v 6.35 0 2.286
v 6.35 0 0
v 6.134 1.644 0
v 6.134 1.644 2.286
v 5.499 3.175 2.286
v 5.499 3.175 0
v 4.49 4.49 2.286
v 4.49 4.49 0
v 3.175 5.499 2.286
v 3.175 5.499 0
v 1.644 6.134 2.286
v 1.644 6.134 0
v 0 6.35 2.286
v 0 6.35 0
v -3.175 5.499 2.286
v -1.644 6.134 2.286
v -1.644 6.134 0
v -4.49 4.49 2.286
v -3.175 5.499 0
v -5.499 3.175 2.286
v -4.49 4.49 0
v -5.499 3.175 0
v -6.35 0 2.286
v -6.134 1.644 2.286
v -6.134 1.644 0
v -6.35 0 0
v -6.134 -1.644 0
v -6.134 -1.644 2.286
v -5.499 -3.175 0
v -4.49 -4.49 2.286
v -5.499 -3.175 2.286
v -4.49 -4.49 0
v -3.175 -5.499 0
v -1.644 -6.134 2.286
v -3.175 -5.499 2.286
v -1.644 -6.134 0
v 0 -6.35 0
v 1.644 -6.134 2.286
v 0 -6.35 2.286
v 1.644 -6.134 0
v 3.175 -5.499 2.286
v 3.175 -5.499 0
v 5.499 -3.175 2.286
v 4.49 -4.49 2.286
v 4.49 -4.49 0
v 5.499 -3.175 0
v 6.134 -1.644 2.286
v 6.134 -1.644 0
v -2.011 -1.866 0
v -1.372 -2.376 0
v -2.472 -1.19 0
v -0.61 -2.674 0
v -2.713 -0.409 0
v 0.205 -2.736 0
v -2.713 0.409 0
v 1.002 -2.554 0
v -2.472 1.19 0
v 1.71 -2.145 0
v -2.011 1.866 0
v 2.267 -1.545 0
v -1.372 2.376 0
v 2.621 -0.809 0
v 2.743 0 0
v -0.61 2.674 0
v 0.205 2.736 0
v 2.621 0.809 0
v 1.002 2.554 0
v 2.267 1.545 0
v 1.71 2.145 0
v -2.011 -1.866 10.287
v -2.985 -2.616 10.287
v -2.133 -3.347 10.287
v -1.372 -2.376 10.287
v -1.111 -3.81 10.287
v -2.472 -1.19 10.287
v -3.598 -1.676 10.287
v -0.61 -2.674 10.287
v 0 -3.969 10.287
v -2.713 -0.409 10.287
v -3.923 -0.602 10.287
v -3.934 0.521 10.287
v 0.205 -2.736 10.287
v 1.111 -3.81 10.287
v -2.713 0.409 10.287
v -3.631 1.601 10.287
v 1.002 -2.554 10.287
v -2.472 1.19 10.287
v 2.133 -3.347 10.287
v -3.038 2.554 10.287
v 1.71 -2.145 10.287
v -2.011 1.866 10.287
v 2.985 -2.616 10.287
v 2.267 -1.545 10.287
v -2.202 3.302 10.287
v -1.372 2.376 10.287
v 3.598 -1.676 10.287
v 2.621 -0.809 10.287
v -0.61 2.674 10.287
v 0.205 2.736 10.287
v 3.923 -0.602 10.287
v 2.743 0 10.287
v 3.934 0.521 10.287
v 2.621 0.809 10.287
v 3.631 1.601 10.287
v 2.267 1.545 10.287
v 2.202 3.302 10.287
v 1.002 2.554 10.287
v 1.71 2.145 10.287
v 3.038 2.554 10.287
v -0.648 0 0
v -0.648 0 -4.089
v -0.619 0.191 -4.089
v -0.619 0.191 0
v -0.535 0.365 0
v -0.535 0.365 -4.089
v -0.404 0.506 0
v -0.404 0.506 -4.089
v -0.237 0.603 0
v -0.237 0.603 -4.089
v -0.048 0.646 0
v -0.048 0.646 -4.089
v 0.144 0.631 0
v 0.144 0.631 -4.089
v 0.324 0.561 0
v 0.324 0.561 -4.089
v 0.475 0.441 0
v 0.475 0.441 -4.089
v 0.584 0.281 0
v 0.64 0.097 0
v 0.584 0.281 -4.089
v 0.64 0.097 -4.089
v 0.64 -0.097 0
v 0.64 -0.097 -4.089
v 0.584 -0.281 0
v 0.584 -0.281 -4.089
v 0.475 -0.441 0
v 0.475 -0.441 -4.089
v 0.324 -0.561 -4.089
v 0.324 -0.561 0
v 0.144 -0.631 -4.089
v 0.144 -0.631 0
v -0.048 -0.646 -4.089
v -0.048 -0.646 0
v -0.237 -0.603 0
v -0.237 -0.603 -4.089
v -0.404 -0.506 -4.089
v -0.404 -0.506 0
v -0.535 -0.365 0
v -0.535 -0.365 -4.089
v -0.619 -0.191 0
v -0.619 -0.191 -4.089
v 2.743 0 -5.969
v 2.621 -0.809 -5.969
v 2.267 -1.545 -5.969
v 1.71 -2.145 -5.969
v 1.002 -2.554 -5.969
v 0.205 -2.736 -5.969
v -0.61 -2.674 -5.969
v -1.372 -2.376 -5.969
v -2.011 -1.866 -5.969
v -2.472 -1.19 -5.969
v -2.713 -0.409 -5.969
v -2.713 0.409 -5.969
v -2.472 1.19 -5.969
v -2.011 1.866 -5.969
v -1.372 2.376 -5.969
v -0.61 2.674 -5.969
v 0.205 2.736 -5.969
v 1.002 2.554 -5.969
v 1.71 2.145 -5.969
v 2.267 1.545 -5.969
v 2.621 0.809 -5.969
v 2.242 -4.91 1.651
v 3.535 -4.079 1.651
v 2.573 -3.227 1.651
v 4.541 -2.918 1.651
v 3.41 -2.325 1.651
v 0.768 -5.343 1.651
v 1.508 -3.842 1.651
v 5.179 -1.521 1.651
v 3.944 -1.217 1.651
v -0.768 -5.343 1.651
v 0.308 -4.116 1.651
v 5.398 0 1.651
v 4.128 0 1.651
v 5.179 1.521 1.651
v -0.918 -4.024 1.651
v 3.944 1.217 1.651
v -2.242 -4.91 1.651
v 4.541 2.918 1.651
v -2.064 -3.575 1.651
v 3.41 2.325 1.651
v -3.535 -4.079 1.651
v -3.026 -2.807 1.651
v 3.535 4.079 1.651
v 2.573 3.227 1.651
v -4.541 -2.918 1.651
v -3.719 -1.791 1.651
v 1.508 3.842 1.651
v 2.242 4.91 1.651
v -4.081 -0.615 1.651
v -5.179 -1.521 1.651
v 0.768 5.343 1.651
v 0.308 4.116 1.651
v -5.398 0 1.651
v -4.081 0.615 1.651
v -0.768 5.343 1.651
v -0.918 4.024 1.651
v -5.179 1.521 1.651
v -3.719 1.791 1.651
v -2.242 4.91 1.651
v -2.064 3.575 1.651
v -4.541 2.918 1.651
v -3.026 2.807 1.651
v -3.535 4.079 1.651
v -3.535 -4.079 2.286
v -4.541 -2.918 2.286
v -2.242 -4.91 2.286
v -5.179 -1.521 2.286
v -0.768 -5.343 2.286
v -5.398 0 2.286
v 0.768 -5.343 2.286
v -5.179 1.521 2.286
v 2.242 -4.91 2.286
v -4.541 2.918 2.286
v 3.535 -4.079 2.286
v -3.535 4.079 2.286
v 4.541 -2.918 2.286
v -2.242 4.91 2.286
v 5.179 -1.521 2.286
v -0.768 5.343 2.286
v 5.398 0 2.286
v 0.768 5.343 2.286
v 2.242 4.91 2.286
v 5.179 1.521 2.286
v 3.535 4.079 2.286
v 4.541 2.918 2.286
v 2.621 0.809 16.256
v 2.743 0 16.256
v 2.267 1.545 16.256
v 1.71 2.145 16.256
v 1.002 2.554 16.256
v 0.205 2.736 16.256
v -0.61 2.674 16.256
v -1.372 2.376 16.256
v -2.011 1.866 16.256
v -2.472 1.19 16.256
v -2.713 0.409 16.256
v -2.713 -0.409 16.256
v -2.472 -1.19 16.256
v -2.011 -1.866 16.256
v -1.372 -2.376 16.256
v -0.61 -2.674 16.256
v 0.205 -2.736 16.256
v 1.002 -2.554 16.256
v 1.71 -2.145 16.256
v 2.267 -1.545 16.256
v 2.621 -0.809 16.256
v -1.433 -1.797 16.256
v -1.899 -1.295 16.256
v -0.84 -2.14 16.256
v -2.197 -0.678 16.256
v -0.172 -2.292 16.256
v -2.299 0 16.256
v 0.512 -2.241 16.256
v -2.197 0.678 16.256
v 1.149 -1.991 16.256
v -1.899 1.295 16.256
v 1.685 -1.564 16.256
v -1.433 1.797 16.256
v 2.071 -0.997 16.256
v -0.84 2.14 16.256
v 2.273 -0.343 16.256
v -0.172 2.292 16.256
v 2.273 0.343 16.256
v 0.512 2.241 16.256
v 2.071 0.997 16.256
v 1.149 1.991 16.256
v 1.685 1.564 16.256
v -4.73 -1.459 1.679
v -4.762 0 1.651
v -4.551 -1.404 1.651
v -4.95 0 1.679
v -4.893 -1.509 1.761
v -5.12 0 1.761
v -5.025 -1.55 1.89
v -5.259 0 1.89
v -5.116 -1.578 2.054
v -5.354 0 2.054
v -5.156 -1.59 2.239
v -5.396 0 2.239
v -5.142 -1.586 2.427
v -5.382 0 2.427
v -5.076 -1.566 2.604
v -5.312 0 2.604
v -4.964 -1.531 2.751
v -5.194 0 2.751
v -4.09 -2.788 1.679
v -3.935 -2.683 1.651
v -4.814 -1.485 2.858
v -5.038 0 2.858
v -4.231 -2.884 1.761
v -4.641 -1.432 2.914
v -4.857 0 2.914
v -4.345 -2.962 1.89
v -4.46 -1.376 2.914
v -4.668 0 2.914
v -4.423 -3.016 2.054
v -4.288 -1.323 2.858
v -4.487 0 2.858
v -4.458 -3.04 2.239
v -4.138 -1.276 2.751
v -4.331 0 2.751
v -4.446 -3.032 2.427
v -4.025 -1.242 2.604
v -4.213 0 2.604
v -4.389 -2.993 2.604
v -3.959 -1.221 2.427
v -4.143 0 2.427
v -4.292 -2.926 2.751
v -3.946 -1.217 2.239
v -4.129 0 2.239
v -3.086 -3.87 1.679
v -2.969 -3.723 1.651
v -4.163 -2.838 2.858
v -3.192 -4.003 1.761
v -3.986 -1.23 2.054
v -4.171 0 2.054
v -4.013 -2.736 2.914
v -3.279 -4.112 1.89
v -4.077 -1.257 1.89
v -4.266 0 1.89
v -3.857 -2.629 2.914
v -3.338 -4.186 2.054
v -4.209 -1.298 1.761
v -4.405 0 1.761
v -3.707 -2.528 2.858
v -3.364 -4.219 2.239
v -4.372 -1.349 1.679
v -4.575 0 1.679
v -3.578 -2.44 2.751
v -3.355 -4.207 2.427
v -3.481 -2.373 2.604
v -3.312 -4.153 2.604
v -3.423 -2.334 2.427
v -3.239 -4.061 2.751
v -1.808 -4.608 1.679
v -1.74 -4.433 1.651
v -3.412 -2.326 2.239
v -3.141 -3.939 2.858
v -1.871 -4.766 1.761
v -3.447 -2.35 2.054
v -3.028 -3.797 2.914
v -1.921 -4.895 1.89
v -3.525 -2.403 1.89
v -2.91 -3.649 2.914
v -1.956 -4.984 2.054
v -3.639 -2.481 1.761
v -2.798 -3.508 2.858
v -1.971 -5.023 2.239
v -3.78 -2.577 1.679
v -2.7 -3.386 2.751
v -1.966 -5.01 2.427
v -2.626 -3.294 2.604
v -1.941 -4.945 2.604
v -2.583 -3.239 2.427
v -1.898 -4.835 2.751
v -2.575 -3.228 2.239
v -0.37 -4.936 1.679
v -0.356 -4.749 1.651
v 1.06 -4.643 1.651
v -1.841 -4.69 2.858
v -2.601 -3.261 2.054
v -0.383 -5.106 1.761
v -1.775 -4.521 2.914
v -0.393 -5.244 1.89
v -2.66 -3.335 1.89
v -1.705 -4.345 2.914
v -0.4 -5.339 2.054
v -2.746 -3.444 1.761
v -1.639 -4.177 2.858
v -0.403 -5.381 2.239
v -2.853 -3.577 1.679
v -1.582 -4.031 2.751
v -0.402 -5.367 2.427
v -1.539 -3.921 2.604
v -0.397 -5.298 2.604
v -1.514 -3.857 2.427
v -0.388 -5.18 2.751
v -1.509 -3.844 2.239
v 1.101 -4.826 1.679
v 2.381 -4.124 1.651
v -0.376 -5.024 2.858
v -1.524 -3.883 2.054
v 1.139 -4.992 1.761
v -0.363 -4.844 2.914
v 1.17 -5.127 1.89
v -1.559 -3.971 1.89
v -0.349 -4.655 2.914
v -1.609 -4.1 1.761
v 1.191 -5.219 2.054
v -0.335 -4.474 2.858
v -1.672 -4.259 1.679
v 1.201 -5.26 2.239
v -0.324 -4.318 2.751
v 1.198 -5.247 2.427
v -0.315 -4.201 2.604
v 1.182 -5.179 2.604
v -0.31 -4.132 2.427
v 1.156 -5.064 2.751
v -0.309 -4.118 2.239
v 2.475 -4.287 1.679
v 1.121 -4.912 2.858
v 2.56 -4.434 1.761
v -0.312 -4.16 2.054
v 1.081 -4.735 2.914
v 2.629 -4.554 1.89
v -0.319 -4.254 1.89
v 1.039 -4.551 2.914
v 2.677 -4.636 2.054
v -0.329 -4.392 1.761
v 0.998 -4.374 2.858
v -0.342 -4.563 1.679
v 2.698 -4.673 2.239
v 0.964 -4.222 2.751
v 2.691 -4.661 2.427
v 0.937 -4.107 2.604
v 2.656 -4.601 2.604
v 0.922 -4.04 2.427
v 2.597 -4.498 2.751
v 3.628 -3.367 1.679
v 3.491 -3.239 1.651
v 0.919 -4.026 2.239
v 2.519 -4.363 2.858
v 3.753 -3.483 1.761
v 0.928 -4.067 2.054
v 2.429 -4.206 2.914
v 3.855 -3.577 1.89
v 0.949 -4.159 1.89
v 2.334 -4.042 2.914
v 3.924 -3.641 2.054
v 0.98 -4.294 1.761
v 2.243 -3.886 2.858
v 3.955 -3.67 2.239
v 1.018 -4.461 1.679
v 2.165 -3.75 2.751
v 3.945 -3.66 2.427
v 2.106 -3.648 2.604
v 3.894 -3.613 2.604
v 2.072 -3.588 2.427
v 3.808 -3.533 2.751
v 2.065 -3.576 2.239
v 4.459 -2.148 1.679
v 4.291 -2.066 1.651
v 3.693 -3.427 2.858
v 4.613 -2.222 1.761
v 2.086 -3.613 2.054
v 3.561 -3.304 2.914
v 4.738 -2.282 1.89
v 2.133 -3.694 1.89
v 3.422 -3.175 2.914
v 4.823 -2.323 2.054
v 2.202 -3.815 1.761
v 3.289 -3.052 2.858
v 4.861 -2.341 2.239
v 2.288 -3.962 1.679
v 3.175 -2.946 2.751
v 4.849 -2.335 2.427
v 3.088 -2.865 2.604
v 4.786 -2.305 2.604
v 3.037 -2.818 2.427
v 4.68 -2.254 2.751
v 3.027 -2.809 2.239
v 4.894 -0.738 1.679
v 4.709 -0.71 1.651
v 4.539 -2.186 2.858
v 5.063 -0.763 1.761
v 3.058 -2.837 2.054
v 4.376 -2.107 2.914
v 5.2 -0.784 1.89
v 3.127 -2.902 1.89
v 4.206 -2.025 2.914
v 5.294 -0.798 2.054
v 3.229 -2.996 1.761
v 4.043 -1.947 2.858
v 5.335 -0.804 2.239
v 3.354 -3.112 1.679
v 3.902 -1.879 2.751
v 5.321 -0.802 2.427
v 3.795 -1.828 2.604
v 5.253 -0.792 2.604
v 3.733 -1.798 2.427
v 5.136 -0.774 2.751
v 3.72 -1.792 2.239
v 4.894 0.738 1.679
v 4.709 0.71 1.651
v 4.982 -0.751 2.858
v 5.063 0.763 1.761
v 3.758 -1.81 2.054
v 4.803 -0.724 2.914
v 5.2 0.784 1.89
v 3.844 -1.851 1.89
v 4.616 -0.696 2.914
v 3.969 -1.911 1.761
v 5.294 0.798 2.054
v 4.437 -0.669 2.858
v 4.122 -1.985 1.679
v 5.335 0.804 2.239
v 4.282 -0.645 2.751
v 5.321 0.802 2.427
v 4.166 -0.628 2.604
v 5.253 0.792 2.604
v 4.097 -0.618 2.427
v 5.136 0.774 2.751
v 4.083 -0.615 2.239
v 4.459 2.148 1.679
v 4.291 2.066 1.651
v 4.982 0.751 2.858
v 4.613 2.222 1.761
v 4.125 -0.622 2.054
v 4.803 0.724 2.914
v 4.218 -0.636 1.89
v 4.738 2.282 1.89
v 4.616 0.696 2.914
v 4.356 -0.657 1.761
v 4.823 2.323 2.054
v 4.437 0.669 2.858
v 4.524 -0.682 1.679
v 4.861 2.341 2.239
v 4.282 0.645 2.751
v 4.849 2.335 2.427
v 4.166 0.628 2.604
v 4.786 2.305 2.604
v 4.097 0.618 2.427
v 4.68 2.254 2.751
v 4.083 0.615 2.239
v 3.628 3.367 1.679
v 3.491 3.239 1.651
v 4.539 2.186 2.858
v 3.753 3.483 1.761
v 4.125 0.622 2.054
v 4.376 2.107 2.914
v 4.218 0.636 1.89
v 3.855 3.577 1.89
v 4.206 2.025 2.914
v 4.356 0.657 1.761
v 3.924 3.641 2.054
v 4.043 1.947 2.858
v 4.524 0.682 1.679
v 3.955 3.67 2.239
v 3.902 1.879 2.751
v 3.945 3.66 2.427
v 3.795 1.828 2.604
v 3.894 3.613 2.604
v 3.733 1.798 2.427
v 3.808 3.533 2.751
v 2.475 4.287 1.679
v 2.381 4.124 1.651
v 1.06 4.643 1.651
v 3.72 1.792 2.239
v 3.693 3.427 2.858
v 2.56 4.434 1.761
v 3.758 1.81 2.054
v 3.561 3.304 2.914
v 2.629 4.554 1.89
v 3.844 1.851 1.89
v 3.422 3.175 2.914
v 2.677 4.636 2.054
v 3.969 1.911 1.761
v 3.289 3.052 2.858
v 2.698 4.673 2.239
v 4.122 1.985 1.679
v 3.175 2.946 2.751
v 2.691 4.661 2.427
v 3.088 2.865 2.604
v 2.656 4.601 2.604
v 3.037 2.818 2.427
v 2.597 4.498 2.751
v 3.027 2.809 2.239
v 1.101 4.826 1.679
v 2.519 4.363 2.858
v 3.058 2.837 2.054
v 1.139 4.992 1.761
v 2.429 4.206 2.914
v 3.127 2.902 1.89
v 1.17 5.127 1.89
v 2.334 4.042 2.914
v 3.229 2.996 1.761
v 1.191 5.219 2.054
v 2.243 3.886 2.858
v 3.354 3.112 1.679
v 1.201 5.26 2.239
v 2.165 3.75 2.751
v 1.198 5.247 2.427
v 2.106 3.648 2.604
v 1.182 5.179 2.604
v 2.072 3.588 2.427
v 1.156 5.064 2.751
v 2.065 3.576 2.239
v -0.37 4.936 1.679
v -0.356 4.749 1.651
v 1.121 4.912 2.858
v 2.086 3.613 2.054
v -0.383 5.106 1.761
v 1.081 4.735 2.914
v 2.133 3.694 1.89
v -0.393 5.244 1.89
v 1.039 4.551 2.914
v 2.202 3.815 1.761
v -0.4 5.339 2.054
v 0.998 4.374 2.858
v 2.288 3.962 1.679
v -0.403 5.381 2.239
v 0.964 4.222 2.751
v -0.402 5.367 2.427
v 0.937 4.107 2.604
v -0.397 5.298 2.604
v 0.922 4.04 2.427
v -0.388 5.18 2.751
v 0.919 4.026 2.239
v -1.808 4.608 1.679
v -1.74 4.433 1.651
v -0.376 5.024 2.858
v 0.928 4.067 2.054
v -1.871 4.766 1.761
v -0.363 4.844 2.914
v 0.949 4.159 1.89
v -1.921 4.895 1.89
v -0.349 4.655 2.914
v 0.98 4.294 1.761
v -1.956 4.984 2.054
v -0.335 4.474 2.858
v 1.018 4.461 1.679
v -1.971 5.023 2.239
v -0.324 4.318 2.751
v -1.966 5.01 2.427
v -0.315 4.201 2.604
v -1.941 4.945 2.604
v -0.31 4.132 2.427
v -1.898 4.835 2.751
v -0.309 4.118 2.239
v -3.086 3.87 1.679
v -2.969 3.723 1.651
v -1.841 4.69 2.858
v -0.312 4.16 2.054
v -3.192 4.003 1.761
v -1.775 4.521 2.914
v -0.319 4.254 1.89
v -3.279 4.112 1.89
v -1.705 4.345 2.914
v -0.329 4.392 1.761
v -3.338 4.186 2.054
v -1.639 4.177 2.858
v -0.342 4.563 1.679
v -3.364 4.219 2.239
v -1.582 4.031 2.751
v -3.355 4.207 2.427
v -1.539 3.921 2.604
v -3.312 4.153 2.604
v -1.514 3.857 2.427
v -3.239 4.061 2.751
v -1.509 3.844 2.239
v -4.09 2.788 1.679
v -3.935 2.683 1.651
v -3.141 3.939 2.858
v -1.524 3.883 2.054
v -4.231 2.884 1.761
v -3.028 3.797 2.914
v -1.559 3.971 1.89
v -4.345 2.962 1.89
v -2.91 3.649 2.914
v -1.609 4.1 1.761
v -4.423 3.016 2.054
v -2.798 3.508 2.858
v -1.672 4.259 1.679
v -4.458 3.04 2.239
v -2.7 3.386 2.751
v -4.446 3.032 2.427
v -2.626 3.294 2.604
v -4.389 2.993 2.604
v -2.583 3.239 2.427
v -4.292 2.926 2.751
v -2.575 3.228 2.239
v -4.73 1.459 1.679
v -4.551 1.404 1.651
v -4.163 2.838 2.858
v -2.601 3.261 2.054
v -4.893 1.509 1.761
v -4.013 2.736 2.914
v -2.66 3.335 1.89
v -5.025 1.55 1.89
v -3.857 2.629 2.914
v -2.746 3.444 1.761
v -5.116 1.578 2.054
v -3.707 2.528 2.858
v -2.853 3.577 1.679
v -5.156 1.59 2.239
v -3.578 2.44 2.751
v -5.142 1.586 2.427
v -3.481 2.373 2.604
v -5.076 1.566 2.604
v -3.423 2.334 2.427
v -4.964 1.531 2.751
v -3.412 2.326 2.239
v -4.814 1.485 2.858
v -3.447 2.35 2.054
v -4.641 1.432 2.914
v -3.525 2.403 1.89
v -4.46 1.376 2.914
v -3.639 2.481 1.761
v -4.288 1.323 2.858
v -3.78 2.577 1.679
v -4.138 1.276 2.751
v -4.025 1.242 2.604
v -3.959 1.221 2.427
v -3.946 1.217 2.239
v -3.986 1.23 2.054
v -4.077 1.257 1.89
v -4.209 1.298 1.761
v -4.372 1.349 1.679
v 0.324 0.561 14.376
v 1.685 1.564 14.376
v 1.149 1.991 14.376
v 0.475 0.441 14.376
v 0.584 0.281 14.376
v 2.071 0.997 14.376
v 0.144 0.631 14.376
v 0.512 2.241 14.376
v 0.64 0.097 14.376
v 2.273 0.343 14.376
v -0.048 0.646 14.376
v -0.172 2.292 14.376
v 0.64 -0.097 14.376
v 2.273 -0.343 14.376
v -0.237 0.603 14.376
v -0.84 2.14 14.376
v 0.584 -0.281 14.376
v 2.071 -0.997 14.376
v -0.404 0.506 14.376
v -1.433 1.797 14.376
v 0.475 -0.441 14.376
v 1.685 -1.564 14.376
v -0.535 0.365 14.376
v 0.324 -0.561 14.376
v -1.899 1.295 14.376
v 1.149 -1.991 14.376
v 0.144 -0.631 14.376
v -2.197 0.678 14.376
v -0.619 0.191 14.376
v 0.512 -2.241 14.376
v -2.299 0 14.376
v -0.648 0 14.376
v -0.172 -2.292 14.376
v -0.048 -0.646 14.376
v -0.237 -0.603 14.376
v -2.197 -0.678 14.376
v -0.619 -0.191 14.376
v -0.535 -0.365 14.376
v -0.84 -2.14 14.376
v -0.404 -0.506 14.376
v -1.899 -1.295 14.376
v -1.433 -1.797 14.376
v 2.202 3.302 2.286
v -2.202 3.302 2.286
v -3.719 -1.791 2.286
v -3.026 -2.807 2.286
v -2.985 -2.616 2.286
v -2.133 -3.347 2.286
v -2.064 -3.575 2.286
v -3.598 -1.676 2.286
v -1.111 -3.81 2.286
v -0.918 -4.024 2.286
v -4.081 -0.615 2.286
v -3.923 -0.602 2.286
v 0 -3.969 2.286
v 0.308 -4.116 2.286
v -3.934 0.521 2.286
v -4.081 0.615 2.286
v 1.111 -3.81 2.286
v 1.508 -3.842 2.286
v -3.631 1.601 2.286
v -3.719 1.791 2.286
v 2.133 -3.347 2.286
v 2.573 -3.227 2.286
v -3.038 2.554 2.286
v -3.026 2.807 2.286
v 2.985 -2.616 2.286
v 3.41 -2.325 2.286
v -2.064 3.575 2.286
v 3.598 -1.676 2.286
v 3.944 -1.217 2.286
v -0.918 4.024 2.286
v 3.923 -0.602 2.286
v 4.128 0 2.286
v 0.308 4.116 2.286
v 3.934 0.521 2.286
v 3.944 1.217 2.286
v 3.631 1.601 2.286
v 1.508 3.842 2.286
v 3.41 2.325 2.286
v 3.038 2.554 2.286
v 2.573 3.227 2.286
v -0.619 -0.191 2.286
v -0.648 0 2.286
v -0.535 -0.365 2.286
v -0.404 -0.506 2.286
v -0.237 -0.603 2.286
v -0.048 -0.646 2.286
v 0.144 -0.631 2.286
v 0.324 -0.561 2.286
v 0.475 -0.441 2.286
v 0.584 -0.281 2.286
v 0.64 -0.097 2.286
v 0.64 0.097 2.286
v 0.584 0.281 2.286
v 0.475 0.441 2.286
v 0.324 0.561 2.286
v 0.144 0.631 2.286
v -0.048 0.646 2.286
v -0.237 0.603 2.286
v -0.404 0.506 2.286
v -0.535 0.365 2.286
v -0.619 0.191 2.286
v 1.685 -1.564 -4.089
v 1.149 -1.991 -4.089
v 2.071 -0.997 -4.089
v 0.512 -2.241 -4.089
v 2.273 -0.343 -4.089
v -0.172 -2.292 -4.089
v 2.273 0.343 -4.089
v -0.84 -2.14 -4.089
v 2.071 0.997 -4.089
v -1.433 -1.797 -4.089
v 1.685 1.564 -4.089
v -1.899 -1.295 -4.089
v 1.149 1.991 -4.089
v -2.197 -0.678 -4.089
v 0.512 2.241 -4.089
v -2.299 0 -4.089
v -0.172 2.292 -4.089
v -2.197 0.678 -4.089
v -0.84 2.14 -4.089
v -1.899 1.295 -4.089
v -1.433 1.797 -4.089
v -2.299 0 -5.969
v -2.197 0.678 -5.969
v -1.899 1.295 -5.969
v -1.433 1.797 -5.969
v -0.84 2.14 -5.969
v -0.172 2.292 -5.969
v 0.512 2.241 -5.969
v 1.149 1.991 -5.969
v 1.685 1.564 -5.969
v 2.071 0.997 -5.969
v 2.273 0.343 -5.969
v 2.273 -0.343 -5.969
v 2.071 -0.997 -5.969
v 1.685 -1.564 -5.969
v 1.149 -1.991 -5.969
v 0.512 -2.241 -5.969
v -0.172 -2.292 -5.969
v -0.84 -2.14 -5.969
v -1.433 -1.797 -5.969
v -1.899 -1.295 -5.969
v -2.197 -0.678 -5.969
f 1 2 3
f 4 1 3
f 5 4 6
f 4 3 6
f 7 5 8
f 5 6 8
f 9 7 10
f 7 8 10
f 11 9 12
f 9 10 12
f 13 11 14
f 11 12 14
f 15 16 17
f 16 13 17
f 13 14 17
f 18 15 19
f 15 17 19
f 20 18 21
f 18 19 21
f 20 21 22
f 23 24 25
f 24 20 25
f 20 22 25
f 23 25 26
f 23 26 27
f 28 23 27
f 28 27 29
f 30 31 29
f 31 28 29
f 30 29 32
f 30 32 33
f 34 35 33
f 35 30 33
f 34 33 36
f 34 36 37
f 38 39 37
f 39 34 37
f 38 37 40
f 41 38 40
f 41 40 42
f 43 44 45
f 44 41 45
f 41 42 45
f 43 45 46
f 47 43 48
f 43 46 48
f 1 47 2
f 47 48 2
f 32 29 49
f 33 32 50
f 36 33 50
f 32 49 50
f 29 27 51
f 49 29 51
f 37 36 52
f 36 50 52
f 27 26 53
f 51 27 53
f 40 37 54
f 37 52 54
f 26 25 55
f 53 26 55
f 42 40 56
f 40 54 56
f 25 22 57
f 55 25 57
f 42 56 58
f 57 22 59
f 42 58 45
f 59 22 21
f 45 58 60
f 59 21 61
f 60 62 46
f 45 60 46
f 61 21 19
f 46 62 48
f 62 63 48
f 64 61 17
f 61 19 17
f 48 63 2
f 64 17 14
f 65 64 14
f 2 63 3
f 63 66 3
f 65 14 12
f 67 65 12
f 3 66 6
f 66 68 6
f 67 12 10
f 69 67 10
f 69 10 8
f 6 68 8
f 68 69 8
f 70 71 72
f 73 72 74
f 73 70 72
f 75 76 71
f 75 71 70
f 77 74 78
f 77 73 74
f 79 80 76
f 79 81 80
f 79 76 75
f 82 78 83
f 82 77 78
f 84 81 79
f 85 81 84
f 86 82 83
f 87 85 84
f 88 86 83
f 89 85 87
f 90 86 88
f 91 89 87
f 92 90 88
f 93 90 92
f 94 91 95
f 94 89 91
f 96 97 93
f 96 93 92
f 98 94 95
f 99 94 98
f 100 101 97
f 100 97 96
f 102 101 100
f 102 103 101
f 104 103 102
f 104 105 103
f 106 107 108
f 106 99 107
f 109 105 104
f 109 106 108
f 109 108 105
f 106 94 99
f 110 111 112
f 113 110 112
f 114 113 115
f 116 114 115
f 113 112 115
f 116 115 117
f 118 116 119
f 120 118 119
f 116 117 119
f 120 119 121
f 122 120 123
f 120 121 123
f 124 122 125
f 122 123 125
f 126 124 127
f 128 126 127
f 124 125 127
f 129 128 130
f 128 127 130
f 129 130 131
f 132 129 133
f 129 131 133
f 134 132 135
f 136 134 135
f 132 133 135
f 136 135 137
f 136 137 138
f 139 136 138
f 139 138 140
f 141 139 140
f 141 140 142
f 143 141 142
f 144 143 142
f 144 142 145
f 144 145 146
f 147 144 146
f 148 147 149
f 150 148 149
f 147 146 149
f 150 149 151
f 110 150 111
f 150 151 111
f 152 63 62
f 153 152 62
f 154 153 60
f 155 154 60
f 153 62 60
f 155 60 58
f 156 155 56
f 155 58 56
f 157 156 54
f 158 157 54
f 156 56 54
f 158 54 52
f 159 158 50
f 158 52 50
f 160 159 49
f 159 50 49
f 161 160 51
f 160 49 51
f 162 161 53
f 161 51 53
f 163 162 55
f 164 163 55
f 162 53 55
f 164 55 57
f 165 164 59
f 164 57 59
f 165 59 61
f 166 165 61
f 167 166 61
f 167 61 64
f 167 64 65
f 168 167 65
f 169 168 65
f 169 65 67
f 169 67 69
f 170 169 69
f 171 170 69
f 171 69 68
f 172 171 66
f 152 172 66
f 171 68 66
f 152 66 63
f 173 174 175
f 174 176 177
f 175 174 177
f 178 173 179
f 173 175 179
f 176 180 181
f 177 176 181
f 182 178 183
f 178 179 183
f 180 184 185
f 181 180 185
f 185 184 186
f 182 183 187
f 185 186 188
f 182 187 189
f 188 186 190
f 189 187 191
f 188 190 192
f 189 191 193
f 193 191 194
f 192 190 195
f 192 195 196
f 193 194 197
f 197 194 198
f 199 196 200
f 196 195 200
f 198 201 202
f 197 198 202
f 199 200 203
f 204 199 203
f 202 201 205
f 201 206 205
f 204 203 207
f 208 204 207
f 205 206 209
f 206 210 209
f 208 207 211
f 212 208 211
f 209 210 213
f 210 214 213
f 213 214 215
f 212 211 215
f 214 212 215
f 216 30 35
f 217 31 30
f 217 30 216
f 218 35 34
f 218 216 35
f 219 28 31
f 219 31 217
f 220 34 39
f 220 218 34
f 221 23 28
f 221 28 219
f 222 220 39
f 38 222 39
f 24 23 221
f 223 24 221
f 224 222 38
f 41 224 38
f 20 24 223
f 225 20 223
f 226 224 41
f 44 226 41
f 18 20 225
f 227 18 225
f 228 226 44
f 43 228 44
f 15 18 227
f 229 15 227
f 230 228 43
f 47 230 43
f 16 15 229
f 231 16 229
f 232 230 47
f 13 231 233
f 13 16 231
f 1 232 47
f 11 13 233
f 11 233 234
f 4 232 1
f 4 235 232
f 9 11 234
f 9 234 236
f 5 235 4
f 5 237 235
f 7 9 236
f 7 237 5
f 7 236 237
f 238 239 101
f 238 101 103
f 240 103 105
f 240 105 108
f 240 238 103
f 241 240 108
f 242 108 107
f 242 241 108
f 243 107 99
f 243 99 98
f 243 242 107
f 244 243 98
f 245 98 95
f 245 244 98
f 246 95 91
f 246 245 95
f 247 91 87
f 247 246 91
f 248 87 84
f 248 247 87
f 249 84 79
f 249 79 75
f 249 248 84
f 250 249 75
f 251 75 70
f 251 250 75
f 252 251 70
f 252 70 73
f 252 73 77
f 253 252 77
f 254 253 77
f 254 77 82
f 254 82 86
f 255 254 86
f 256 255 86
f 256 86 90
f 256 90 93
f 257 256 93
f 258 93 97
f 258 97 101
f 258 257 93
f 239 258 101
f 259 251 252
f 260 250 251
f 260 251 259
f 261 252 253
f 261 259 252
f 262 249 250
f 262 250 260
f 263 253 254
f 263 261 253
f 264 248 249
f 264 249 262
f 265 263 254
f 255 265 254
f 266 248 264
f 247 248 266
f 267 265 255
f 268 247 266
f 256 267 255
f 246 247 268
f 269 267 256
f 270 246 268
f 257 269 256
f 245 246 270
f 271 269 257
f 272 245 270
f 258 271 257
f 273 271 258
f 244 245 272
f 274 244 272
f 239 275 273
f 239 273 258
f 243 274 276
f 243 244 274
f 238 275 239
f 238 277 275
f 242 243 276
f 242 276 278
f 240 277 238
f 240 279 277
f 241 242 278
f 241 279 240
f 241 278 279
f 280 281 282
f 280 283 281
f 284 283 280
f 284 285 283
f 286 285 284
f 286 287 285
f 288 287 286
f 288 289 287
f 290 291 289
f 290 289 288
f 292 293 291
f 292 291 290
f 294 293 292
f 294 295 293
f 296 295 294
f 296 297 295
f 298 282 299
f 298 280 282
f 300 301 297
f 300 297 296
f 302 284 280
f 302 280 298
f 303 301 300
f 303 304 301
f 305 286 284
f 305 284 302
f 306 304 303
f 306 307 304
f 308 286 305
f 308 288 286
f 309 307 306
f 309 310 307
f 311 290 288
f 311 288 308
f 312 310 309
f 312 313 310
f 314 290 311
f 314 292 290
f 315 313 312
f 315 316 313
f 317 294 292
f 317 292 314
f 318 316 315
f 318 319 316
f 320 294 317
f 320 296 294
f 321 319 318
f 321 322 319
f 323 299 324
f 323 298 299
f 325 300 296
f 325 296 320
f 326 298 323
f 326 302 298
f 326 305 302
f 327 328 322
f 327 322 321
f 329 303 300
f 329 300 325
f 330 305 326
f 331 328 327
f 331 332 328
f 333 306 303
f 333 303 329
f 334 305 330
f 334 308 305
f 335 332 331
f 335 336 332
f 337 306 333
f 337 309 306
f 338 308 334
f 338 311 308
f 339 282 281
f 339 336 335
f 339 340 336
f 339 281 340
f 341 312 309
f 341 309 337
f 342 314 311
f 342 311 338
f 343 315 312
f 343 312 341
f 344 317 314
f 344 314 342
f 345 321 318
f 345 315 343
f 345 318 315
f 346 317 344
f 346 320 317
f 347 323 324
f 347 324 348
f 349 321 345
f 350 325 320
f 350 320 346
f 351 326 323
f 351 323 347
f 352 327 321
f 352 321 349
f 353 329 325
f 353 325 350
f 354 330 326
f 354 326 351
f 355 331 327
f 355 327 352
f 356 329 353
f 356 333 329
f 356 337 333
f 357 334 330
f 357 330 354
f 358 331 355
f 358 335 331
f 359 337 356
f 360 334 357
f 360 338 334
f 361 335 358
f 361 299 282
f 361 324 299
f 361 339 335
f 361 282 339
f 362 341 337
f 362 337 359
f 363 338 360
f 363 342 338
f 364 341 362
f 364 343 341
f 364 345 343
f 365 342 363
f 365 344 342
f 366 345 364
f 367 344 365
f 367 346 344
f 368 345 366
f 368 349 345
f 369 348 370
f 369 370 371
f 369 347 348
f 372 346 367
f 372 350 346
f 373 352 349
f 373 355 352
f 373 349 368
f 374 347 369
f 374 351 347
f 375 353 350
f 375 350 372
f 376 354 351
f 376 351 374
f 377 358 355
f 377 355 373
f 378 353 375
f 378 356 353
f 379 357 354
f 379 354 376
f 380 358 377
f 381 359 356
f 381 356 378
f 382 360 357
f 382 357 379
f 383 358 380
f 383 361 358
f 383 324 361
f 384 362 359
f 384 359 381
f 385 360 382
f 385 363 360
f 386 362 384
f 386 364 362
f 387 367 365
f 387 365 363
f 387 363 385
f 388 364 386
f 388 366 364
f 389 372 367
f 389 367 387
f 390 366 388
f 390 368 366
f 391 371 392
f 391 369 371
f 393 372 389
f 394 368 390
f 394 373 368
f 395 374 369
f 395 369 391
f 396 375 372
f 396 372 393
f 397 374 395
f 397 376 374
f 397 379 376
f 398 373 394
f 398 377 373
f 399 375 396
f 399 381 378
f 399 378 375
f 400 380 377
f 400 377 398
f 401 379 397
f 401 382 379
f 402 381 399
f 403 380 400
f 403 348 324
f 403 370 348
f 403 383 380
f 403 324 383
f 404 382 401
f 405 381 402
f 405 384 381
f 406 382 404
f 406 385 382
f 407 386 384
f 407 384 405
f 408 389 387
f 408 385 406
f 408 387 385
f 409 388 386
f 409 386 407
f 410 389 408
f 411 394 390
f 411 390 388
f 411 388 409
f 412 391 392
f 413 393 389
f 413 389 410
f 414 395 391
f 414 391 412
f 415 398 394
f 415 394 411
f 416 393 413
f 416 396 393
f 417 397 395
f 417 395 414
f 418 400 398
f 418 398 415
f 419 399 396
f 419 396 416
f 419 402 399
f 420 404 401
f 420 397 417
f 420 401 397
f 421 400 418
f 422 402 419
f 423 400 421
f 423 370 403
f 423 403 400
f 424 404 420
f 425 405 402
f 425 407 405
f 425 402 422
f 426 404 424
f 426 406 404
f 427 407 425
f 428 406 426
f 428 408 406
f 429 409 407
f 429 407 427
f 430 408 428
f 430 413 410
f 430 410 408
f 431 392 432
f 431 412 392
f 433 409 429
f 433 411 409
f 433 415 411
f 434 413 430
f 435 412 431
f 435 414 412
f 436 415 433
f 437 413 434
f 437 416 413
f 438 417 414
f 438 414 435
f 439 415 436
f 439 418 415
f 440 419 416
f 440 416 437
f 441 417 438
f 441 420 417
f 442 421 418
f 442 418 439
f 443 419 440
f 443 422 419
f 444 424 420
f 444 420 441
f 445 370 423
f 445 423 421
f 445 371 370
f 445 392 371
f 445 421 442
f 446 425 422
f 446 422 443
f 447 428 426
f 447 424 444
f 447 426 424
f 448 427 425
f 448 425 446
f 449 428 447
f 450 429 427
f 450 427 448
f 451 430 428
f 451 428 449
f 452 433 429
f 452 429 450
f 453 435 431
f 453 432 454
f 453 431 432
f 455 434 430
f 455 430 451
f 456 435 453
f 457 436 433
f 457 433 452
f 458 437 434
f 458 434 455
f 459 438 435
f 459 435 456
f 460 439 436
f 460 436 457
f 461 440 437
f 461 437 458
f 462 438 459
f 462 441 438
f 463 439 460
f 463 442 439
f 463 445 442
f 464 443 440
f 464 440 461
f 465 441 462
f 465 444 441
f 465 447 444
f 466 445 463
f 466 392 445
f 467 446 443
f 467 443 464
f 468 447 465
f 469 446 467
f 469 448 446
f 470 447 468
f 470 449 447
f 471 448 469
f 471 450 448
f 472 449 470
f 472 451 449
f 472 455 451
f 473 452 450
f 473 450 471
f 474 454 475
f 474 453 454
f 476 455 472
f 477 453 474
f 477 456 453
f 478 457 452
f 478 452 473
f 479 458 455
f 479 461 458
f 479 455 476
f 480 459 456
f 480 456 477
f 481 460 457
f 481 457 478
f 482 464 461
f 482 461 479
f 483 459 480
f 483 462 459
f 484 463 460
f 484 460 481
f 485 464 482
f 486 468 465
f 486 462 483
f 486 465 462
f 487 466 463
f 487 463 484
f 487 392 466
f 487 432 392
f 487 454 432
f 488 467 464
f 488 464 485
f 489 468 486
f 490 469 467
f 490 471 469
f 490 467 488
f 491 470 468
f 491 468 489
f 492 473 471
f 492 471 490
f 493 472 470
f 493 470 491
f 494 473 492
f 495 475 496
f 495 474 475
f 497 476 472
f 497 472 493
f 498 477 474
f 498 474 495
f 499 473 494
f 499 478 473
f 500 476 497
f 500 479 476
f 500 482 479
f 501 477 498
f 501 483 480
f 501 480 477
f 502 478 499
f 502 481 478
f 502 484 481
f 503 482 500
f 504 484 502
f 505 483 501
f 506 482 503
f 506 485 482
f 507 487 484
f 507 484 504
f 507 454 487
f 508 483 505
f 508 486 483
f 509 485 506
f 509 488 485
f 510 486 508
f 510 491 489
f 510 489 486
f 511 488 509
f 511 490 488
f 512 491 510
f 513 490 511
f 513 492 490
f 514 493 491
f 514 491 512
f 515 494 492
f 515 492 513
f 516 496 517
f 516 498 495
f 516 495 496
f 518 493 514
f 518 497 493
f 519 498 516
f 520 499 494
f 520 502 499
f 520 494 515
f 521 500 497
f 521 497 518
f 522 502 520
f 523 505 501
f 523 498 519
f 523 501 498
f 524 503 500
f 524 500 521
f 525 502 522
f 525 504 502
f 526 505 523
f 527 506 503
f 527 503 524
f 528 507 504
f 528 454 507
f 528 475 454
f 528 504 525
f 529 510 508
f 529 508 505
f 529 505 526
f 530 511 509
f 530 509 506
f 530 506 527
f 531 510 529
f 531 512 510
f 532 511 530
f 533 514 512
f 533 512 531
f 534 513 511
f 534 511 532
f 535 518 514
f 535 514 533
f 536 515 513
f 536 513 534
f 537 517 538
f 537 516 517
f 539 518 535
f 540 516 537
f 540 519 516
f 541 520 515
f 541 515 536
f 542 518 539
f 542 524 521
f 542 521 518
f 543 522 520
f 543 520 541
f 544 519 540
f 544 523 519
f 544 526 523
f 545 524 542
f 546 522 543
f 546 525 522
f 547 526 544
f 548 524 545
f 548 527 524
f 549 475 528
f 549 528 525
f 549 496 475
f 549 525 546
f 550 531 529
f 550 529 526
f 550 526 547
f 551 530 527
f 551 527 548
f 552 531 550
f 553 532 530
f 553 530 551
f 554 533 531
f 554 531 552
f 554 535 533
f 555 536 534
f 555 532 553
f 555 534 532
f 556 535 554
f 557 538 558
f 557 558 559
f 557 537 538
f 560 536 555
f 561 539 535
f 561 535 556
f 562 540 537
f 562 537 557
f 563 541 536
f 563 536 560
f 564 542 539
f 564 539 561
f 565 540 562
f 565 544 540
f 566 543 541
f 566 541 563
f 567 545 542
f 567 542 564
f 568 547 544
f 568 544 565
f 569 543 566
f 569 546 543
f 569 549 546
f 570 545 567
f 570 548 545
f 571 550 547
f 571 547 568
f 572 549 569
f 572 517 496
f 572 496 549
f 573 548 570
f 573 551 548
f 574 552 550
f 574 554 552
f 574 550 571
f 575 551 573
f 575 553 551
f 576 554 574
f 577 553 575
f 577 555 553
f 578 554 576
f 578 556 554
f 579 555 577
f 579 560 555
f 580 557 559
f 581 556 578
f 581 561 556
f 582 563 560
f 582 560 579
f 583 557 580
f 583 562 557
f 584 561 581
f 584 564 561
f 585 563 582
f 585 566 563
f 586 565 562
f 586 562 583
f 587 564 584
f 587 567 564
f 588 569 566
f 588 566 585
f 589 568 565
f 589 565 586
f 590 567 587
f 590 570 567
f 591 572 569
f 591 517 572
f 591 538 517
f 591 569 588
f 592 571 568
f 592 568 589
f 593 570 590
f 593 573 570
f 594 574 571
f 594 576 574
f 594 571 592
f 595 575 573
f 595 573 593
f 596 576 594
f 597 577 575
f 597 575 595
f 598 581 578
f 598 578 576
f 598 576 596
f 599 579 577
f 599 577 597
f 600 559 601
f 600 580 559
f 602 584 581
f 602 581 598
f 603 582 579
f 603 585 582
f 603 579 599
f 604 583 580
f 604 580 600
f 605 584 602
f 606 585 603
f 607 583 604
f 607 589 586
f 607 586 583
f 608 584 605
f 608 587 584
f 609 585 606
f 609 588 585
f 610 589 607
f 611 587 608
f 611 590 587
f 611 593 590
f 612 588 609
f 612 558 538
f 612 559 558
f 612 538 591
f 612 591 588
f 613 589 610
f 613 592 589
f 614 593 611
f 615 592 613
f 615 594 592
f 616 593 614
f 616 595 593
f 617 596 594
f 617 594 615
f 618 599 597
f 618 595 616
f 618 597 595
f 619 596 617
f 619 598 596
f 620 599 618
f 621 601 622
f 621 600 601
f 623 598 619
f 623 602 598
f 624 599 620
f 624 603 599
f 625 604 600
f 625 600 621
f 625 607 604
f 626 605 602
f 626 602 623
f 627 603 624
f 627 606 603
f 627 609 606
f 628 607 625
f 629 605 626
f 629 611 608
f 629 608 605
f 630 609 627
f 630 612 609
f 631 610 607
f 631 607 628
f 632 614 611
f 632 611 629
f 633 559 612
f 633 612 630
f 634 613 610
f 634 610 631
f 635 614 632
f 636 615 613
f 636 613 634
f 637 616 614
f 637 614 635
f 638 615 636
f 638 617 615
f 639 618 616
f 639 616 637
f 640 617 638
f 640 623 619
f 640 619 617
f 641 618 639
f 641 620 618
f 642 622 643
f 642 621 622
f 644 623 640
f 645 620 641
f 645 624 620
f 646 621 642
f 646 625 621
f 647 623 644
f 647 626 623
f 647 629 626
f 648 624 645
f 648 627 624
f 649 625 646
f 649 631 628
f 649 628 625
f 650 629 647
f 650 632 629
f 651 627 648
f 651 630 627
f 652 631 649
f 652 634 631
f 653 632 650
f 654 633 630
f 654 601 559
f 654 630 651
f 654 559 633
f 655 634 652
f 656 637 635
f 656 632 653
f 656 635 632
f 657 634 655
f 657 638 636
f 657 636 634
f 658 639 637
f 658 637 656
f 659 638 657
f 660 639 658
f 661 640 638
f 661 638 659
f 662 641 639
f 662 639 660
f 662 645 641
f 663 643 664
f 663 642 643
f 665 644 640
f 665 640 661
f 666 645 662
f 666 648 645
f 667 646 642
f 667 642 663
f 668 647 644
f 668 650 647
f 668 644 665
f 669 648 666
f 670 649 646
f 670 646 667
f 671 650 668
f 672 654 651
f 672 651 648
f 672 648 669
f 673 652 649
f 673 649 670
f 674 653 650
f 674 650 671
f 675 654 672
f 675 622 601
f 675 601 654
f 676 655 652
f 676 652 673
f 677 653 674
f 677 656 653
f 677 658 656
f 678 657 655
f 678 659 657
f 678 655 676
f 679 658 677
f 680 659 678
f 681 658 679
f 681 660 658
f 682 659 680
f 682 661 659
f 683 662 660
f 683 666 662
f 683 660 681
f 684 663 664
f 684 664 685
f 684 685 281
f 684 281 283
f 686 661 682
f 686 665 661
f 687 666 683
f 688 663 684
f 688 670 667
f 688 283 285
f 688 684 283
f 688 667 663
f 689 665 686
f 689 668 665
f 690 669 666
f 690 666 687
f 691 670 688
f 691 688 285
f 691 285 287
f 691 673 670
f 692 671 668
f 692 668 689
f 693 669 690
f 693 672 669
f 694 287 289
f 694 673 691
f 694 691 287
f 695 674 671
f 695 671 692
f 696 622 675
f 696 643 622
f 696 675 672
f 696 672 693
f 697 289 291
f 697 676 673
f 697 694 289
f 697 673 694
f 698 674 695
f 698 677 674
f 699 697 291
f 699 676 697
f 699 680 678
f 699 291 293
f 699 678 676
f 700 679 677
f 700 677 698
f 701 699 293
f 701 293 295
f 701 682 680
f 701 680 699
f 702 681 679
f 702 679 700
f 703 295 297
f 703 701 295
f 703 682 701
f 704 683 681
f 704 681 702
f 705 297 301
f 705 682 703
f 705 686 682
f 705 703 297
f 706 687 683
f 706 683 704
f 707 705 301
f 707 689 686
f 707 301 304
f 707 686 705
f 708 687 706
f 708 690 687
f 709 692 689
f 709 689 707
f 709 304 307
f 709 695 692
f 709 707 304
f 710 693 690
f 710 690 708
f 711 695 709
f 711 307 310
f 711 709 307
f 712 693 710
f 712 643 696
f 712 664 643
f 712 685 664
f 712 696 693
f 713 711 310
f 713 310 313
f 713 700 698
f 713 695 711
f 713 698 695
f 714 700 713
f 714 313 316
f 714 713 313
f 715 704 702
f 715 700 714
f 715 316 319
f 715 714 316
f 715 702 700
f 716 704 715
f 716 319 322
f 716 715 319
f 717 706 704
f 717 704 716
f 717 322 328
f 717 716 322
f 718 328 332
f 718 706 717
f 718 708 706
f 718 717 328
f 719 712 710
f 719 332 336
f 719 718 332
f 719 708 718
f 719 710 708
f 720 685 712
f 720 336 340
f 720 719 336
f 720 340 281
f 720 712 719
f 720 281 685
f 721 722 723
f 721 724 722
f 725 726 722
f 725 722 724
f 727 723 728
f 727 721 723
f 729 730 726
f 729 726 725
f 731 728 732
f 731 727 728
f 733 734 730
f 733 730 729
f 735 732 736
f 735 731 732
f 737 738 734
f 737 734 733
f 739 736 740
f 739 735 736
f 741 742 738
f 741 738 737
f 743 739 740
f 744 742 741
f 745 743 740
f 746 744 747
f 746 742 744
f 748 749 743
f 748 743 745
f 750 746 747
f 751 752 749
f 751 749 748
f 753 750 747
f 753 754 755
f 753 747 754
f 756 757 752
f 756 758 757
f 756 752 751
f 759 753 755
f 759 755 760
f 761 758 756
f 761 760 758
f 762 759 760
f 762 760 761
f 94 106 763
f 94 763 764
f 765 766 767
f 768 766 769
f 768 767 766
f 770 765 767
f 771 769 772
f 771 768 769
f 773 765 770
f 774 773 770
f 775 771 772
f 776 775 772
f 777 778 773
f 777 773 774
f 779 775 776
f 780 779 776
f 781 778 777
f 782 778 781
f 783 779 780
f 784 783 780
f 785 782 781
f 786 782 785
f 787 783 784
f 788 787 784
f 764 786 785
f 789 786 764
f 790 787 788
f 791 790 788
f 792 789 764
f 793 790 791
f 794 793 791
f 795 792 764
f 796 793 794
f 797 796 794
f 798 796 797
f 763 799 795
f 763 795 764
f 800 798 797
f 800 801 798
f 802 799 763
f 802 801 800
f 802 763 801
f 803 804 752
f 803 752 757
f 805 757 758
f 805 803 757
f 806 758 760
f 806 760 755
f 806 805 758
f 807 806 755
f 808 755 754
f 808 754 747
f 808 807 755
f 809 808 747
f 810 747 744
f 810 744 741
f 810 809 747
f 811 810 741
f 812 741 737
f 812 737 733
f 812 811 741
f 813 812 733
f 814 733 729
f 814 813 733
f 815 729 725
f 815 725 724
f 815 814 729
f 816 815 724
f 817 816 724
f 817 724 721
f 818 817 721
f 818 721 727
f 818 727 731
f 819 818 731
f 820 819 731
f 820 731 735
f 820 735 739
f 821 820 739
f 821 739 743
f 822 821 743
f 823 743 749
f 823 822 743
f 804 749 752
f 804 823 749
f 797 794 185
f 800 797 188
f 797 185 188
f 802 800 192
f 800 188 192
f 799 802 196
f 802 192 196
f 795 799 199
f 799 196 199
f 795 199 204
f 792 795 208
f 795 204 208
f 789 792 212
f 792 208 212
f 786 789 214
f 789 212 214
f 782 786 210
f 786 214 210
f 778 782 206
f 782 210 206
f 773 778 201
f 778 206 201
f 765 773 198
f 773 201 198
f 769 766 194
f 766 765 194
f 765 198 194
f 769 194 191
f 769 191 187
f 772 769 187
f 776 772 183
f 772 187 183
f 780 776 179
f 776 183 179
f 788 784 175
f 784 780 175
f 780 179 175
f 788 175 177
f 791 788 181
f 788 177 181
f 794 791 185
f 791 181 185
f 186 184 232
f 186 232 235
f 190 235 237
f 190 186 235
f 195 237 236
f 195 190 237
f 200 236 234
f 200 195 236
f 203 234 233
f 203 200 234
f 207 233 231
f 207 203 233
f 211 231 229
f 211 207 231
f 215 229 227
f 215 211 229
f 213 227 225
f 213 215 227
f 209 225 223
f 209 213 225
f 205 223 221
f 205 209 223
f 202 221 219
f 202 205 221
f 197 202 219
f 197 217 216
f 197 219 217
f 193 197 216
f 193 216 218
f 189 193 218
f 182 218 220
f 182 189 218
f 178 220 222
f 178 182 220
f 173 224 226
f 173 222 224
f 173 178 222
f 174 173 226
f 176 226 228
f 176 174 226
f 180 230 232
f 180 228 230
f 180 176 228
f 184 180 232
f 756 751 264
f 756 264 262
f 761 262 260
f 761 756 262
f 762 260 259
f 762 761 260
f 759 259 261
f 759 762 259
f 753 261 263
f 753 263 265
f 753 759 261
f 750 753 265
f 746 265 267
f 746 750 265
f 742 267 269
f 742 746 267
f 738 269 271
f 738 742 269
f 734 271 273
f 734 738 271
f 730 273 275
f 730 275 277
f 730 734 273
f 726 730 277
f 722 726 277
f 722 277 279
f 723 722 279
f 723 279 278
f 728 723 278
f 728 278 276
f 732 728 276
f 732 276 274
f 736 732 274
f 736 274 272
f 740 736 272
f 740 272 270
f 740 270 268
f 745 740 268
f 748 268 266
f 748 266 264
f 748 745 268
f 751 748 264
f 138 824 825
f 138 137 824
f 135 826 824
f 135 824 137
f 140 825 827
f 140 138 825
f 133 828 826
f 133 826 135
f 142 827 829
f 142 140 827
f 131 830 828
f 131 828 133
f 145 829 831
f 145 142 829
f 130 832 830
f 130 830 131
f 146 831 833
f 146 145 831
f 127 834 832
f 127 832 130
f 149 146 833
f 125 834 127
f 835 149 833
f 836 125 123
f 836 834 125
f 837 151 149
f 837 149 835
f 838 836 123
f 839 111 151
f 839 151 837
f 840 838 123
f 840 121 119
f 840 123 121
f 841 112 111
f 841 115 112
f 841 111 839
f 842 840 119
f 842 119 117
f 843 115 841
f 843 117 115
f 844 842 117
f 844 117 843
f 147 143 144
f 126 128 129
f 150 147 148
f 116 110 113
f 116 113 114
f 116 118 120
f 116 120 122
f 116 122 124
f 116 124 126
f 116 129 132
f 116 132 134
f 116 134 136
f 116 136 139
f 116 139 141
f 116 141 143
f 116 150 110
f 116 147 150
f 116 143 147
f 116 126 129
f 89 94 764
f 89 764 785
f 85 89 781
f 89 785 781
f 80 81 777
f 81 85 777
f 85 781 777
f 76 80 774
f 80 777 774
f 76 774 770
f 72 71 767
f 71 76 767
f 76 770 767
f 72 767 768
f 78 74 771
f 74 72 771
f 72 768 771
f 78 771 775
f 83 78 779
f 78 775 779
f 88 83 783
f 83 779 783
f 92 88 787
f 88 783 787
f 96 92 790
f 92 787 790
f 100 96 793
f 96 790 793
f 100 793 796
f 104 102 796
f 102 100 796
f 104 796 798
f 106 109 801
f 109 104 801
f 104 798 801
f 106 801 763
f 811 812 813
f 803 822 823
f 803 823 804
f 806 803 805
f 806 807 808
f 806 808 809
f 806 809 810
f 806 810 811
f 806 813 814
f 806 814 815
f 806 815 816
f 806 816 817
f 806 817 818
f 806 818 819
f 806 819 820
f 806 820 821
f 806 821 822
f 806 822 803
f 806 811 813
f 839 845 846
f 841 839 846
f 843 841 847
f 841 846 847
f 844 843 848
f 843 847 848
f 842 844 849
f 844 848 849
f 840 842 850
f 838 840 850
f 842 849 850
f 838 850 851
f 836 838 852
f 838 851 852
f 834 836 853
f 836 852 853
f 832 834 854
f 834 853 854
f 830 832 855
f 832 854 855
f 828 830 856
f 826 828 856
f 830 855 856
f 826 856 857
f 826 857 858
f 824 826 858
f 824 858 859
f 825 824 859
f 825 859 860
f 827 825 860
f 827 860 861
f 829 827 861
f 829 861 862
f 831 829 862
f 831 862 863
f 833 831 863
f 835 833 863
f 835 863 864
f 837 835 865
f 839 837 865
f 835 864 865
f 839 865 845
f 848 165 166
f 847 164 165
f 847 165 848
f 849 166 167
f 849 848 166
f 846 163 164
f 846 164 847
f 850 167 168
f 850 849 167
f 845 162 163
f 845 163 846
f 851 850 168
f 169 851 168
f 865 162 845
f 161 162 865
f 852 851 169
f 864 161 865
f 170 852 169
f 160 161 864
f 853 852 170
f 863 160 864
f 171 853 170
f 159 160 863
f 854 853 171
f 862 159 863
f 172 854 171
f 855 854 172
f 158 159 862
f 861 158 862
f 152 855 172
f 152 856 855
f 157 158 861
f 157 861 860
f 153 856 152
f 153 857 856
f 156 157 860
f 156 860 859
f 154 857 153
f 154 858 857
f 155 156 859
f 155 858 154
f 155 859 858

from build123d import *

# Parameters (mm, degrees)
SKETCH1_R          = 6.35
EXTRUDE1_DEPTH     = 2.286
SKETCH2_R          = 2.7432
EXTRUDE2_DEPTH     = 5.969
SKETCH3_R          = 2.2987
CUT_EXTRUDE1_DEPTH = 1.8796
SKETCH4_R          = 0.6477
CUT_EXTRUDE2_DEPTH = 4.0894
SKETCH5_R          = 3.96875
EXTRUDE3_DEPTH     = 8.001
EXTRUDE4_START     = 5.969
SKETCH6_R          = 2.7432
EXTRUDE4_DEPTH     = 5.969
CUT_EXTRUDE3_START = -1.8796
SKETCH7_R          = 2.2987
CUT_EXTRUDE3_DEPTH = 1.8796
CUT_EXTRUDE4_START = -12.0904
SKETCH8_R          = 0.6477
CUT_EXTRUDE4_DEPTH = 12.0904
SKETCH9_W          = 0.635
SKETCH9_H          = 1.27
SKETCH12_W         = 7.9375
SKETCH12_H         = 8.001
CUT_EXTRUDE5_DEPTH = 20.943448548
SKETCH10_R         = 0.635


with BuildPart() as part:
    # Sketch1 → Extrude1 (new body)
    with BuildSketch(Plane.XY):
        Circle(SKETCH1_R)
    extrude(amount=EXTRUDE1_DEPTH)

    # Sketch2 → Extrude2 (add)
    with BuildSketch(Plane(origin=(0, 0, 0), x_dir=(-1, 0, 0), z_dir=(0, 0, -1))):
        with Locations(Location((0, 0, 0), (0, 0, 180))):
            Circle(SKETCH2_R)
    extrude(amount=EXTRUDE2_DEPTH)

    # Sketch3 → Cut-Extrude1 (cut)
    with BuildSketch(Plane(origin=(0, 0, -5.969), x_dir=(-1, 0, 0), z_dir=(0, 0, -1))):
        Circle(SKETCH3_R)
    extrude(amount=-CUT_EXTRUDE1_DEPTH, mode=Mode.SUBTRACT)

    # Sketch4 → Cut-Extrude2 (cut)
    with BuildSketch(Plane(origin=(0, 0, -4.0894), x_dir=(-1, 0, 0), z_dir=(0, 0, -1))):
        Circle(SKETCH4_R)
    extrude(amount=-CUT_EXTRUDE2_DEPTH, mode=Mode.SUBTRACT)

    # Sketch5 → Extrude3 (add)
    with BuildSketch(Plane.XY.offset(2.286)):
        Circle(SKETCH5_R)
    extrude(amount=EXTRUDE3_DEPTH)

    # Sketch6 → Extrude4 (add)
    with BuildSketch(Plane.XY.offset(10.287).offset(EXTRUDE4_START)):
        Circle(SKETCH6_R)
    extrude(amount=-EXTRUDE4_DEPTH)

    # Sketch7 → Cut-Extrude3 (cut)
    with BuildSketch(Plane.XY.offset(16.256).offset(CUT_EXTRUDE3_START)):
        with Locations(Location((0, 0, 0), (0, 0, 180))):
            Circle(SKETCH7_R)
    extrude(amount=CUT_EXTRUDE3_DEPTH, mode=Mode.SUBTRACT)

    # Sketch8 → Cut-Extrude4 (cut)
    with BuildSketch(Plane.XY.offset(14.3764).offset(CUT_EXTRUDE4_START)):
        with Locations(Location((0, 0, 0), (0, 0, 180))):
            Circle(SKETCH8_R)
    extrude(amount=CUT_EXTRUDE4_DEPTH, mode=Mode.SUBTRACT)

    # Sketch9 → Cut-Revolve1 (revolve, cut)
    with BuildSketch(Plane(origin=(0, 0, 0), x_dir=(0, 0, -1), z_dir=(1, 0, 0)), mode=Mode.PRIVATE) as cut_revolve1_sk:
        with Locations((-1.9685, 4.7625)):
            Rectangle(SKETCH9_W, SKETCH9_H)
    revolve(cut_revolve1_sk.sketch.rotate(Axis((0, 0, -7.08025), (0, 0, 1)), 270), axis=Axis((0, 0, -7.08025), (0, 0, 1)), mode=Mode.SUBTRACT)

    # Sketch12 → Cut-Extrude5 (cut, through all)
    with BuildSketch(Plane(origin=(0, 3.302, 0), x_dir=(-1, 0, 0), z_dir=(0, 1, 0))):
        with Locations((0, 6.2865)):
            Rectangle(SKETCH12_W, SKETCH12_H)
    extrude(amount=CUT_EXTRUDE5_DEPTH, mode=Mode.SUBTRACT)


with BuildPart() as body_2:
    # Sketch10 → Revolve1 (revolve)
    with BuildSketch(Plane(origin=(0, 0, 0), x_dir=(0, 0, -1), z_dir=(1, 0, 0)), mode=Mode.PRIVATE) as revolve1_sk:
        with Locations((-2.286, 4.7625)):
            Circle(SKETCH10_R)
    revolve(revolve1_sk.sketch.rotate(Axis((0, 0, -7.08025), (0, 0, 1)), 90), axis=Axis((0, 0, -7.08025), (0, 0, 1)))


solid = Compound([part.part, body_2.part])
